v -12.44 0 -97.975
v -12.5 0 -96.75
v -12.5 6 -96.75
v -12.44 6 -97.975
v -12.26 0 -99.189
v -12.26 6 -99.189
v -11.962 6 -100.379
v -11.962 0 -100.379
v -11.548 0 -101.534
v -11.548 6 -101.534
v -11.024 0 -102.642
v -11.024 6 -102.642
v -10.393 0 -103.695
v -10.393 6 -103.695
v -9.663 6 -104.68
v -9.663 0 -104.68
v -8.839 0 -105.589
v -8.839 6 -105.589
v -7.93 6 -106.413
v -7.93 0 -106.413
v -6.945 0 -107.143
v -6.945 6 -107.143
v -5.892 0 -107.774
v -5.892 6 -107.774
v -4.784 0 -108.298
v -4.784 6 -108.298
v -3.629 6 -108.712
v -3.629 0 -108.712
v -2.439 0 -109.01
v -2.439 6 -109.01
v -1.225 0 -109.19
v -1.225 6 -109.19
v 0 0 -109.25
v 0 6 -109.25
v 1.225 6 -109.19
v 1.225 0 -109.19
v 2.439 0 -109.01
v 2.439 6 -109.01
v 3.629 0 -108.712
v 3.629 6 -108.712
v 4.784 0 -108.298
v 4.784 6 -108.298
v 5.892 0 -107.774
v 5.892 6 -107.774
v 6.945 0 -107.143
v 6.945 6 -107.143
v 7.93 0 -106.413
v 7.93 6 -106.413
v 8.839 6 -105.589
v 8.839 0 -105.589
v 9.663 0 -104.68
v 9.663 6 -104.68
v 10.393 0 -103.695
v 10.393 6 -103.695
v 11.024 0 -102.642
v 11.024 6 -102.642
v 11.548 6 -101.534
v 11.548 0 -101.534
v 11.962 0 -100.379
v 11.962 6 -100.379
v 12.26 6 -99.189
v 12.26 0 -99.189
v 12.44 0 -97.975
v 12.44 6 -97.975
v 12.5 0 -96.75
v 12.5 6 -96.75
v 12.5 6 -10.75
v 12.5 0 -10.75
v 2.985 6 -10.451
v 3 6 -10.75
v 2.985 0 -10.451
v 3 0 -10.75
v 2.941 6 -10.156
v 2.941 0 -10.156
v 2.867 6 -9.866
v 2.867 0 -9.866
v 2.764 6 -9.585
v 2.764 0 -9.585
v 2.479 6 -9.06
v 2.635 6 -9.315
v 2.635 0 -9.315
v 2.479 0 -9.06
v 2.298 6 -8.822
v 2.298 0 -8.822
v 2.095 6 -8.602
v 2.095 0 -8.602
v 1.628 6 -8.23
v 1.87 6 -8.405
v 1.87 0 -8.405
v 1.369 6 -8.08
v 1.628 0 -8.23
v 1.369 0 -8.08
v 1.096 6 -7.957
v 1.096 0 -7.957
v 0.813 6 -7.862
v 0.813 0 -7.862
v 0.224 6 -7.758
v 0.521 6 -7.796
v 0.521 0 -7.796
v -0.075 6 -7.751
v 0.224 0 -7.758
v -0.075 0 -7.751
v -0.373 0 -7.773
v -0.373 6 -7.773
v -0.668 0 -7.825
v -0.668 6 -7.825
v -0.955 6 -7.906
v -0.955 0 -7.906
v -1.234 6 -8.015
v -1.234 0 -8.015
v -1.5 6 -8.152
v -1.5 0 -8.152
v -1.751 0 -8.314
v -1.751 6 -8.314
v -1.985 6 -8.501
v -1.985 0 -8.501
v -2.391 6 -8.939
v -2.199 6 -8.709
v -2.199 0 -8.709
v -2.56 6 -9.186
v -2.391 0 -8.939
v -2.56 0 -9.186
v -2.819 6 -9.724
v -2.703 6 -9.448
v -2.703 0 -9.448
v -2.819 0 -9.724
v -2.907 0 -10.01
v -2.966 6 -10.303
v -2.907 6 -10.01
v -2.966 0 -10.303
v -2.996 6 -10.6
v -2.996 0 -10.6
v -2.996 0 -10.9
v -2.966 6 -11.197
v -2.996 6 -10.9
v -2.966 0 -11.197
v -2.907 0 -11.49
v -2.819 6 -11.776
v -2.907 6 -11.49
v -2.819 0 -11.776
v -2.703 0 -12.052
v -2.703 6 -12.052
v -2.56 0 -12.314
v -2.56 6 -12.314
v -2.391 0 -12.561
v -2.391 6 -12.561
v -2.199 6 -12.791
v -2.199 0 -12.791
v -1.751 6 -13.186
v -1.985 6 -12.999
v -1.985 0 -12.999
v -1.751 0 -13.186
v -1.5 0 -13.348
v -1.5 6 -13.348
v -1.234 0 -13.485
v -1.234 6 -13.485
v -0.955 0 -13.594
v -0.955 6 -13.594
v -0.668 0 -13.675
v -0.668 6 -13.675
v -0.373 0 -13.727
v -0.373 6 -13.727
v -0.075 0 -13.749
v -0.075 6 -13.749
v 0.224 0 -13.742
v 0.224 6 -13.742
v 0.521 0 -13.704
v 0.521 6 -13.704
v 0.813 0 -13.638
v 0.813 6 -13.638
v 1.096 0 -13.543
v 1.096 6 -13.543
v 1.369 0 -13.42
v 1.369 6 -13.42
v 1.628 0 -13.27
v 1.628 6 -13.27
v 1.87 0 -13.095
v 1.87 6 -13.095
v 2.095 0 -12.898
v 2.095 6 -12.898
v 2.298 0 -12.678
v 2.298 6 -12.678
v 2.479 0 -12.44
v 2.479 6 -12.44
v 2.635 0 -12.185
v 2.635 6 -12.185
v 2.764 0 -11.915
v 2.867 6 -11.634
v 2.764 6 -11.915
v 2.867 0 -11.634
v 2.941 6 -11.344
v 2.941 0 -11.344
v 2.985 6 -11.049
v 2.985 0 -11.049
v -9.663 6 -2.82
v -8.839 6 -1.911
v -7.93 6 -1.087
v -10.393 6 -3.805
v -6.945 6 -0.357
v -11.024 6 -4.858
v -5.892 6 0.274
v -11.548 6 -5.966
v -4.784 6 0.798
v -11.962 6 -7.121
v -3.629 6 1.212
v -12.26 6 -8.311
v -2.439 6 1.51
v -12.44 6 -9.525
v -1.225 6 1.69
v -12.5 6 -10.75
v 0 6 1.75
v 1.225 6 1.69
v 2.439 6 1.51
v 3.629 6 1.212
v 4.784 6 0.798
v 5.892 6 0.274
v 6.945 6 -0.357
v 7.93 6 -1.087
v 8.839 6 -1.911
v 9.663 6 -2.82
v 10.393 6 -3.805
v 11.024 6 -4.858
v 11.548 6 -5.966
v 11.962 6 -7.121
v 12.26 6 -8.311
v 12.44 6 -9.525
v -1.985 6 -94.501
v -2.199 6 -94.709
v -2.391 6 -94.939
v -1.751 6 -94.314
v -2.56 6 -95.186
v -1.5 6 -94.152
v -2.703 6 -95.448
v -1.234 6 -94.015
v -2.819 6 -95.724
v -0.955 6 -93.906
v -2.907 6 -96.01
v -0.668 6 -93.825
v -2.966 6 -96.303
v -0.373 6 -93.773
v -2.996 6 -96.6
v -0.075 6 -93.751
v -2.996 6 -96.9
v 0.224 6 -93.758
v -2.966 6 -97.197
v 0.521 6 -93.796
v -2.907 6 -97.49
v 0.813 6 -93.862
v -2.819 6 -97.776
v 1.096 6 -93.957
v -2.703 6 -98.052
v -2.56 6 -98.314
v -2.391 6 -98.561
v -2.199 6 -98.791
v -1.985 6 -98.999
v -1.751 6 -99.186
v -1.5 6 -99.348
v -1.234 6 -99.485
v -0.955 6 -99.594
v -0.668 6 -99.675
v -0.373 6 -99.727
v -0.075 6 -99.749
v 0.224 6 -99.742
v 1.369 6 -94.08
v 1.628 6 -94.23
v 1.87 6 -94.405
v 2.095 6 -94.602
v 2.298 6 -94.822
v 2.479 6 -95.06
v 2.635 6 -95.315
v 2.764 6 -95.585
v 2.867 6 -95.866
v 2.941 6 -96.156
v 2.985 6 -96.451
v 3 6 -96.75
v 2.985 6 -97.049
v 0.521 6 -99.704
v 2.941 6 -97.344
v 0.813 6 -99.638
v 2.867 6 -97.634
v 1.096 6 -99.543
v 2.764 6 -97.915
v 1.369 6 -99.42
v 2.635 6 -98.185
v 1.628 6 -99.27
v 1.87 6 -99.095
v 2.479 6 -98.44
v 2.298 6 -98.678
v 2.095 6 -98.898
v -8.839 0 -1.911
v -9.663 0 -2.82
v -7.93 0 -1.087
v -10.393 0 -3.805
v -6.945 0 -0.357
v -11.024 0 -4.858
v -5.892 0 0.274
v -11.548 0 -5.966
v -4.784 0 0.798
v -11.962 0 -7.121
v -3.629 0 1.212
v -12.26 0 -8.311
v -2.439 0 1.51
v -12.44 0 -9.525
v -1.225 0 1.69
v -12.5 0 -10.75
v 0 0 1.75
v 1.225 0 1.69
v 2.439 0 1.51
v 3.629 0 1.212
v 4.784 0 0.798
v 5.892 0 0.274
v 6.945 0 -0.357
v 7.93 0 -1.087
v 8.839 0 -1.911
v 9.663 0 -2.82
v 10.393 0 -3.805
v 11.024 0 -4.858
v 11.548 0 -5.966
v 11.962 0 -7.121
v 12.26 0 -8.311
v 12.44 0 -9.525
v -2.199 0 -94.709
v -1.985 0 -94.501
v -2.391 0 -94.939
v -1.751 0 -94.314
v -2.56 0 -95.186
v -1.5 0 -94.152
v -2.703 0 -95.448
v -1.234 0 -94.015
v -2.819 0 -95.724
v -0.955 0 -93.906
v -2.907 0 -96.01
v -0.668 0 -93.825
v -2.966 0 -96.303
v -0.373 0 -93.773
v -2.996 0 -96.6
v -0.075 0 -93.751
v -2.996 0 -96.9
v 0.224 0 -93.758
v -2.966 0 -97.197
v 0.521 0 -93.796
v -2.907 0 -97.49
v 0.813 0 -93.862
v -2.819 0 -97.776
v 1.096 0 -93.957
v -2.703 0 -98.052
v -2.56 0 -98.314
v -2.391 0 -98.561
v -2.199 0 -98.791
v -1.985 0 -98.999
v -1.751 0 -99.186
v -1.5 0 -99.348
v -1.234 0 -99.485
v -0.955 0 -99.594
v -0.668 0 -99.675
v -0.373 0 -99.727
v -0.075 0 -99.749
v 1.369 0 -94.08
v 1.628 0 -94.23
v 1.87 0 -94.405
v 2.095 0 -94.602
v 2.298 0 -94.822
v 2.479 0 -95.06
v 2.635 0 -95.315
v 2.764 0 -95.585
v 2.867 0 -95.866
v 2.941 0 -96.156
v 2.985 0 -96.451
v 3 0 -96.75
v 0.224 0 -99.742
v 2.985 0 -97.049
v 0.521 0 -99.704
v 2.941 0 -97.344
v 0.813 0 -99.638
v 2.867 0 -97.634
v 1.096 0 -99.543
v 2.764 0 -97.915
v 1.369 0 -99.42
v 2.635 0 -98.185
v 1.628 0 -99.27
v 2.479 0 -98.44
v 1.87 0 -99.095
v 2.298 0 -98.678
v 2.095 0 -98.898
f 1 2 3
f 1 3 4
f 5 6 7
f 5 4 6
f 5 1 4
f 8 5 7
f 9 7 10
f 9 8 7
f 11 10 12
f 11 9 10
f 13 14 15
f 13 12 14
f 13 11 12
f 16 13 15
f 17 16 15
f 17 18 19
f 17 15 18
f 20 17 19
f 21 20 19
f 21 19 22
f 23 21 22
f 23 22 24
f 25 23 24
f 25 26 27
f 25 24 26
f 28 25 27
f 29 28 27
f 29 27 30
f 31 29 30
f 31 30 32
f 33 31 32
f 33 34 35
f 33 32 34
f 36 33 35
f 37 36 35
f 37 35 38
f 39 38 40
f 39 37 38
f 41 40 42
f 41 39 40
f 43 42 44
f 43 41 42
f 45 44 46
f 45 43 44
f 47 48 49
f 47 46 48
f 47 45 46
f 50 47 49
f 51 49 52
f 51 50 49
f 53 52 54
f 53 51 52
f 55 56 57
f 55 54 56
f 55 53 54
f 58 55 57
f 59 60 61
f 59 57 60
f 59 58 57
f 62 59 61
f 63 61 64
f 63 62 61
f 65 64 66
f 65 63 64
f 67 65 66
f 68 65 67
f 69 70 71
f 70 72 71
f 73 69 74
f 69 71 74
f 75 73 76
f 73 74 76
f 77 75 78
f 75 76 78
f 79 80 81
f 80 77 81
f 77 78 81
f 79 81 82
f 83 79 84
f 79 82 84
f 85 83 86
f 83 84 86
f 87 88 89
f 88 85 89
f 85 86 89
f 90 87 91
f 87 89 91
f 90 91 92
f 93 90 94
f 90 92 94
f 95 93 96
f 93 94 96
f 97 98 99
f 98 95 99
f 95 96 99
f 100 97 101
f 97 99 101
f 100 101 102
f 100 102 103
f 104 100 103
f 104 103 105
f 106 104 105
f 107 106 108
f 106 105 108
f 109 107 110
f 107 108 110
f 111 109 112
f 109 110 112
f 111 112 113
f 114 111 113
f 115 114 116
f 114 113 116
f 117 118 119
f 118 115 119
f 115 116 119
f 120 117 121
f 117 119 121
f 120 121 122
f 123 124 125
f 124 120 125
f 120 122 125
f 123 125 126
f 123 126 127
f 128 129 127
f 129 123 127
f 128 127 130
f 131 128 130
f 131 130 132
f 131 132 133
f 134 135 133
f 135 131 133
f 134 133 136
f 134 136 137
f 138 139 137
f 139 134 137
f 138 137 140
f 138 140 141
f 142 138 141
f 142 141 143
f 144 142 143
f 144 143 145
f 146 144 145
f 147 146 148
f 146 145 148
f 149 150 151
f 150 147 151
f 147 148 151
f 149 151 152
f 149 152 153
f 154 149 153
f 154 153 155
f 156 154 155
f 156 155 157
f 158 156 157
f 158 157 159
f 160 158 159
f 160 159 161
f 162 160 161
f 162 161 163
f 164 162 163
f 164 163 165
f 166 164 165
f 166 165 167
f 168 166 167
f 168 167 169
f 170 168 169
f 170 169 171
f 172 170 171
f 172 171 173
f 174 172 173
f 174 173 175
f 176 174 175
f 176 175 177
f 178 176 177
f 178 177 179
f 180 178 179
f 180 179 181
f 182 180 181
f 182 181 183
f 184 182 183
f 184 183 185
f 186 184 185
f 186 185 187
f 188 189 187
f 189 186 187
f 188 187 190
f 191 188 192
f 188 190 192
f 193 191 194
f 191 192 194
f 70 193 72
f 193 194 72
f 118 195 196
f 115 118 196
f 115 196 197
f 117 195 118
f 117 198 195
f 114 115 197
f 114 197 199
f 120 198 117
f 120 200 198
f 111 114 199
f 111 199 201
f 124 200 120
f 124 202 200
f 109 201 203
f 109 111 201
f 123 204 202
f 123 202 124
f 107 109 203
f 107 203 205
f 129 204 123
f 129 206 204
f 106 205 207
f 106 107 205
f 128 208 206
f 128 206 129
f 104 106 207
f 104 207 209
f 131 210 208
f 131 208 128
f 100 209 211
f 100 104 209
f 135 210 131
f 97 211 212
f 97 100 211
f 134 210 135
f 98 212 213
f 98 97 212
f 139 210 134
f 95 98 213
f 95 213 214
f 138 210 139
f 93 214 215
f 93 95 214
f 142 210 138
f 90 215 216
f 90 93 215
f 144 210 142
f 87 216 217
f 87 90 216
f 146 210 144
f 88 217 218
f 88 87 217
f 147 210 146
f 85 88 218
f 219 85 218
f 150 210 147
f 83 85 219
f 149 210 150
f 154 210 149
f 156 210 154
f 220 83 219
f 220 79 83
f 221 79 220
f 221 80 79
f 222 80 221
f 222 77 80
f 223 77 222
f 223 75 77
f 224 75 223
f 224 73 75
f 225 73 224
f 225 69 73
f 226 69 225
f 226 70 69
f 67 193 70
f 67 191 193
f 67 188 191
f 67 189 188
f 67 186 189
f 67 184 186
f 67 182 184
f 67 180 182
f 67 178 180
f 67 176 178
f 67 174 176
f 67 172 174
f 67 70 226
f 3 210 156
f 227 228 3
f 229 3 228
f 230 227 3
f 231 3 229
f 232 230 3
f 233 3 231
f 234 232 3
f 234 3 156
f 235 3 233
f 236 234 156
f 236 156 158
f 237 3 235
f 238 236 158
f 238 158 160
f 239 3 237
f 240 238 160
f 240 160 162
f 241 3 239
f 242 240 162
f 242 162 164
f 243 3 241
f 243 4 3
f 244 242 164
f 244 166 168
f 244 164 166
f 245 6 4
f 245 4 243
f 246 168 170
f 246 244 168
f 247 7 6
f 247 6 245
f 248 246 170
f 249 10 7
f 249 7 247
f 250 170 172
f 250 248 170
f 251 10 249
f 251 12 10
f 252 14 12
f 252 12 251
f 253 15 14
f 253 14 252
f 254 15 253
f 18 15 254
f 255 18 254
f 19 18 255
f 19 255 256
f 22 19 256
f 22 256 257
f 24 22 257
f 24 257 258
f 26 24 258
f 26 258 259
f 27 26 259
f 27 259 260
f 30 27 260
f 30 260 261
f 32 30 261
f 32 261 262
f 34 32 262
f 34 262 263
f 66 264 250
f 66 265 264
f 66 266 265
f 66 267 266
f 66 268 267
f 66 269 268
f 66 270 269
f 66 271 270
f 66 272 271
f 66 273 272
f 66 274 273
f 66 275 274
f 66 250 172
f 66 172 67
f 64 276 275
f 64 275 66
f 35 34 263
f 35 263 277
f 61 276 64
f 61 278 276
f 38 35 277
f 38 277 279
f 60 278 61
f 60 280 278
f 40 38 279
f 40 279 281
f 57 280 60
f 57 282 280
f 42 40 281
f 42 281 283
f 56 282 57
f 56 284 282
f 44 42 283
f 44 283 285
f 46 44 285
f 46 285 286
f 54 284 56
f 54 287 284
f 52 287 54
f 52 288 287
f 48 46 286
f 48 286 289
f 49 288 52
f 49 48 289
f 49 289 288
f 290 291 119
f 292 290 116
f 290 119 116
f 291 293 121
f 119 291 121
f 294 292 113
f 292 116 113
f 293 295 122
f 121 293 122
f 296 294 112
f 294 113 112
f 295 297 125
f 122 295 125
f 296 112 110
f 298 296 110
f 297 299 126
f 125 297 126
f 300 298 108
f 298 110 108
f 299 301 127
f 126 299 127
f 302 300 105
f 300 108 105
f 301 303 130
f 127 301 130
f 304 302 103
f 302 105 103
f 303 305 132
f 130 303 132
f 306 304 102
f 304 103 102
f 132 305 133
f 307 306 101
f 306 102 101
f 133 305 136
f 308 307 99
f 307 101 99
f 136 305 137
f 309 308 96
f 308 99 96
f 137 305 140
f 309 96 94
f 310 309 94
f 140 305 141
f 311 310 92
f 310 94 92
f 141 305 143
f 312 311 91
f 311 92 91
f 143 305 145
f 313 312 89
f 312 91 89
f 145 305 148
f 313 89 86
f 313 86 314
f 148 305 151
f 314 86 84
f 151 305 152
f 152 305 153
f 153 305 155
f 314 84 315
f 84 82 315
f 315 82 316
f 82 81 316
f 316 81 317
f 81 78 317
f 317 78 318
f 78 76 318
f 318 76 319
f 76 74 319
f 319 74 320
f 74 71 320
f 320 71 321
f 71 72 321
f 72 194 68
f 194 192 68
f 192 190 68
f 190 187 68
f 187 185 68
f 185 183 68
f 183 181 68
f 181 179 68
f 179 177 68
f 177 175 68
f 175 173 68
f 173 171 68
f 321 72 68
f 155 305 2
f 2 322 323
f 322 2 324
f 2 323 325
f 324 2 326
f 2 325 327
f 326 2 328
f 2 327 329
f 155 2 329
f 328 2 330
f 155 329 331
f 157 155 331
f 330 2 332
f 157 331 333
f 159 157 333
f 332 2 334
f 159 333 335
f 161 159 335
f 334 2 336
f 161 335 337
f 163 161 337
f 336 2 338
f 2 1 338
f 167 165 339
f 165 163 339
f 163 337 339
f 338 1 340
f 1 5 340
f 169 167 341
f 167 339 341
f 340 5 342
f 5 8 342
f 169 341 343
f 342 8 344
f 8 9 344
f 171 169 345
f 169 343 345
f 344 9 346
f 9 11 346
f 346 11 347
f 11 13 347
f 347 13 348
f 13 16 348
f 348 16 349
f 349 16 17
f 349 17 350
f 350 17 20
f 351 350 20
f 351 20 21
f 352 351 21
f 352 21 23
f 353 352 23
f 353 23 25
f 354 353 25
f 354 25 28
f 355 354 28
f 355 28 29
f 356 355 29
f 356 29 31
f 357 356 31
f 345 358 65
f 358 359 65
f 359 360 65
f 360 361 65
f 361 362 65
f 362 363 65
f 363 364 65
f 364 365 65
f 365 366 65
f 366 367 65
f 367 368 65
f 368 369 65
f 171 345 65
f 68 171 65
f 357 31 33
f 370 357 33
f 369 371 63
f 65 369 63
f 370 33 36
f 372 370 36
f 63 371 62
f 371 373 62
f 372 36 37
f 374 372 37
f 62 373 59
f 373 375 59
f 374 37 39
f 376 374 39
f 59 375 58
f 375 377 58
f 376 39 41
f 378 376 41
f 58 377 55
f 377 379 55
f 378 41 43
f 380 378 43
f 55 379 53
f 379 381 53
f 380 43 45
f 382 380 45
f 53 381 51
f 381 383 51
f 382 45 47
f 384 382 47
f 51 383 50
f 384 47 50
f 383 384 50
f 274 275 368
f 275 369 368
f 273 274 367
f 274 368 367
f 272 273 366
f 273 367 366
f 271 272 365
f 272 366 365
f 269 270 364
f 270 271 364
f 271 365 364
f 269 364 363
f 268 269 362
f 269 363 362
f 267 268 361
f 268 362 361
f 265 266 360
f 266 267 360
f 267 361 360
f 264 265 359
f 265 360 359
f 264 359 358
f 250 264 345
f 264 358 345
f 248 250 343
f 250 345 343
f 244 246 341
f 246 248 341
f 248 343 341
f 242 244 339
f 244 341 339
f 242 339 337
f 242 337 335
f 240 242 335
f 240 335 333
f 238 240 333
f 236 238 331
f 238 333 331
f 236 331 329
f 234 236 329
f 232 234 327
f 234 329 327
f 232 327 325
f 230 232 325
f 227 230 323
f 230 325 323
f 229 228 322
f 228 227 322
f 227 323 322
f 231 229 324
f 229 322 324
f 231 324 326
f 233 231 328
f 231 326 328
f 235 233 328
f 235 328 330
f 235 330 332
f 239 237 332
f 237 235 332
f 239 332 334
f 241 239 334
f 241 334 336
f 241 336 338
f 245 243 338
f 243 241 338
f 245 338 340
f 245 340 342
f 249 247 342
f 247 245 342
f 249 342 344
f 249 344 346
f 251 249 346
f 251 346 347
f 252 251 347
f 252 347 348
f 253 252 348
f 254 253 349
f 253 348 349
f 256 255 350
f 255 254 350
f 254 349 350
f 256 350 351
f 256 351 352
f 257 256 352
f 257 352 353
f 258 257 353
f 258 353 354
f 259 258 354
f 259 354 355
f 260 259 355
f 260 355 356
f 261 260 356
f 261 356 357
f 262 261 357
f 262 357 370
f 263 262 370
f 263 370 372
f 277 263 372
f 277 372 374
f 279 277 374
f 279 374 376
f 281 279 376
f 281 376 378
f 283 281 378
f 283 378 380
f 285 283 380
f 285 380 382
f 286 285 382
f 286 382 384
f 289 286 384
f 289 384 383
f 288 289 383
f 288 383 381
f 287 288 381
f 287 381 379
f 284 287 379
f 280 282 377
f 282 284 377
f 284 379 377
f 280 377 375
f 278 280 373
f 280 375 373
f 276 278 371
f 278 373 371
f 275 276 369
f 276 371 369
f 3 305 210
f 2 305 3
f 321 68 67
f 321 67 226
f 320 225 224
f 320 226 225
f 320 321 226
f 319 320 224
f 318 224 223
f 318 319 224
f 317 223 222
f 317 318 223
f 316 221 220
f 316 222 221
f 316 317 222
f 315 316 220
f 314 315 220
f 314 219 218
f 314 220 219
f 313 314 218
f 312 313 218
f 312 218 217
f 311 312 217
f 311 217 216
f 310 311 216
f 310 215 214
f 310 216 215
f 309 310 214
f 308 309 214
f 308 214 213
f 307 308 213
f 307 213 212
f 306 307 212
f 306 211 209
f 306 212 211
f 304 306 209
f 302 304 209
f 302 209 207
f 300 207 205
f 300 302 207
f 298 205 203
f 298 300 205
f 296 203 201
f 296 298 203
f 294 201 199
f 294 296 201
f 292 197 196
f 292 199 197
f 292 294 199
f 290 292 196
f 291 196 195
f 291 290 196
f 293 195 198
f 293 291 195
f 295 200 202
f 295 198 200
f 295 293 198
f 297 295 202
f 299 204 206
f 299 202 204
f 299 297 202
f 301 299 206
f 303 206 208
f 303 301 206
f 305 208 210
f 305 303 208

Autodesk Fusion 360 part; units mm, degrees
sketch "Sketch1" plane through (0, 0, 0) normal (0, 1, 0) x (1, 0, 0)
  arc A0 (12.5, 96.75) -> (-12.5, 96.75) centre (0, 96.75) ccw
  line L0 (12.5, 96.75) -> (12.5, 10.75)
  arc A1 (-12.5, 10.75) -> (12.5, 10.75) centre (0, 10.75) ccw
  circle A2 centre (0, 96.75) radius 3
  circle A3 centre (0, 10.75) radius 3
  line L1 (-12.5, 10.75) -> (-12.5, 96.75)
extrude "Extrude1" add sketch "Sketch1" along normal blind 6
